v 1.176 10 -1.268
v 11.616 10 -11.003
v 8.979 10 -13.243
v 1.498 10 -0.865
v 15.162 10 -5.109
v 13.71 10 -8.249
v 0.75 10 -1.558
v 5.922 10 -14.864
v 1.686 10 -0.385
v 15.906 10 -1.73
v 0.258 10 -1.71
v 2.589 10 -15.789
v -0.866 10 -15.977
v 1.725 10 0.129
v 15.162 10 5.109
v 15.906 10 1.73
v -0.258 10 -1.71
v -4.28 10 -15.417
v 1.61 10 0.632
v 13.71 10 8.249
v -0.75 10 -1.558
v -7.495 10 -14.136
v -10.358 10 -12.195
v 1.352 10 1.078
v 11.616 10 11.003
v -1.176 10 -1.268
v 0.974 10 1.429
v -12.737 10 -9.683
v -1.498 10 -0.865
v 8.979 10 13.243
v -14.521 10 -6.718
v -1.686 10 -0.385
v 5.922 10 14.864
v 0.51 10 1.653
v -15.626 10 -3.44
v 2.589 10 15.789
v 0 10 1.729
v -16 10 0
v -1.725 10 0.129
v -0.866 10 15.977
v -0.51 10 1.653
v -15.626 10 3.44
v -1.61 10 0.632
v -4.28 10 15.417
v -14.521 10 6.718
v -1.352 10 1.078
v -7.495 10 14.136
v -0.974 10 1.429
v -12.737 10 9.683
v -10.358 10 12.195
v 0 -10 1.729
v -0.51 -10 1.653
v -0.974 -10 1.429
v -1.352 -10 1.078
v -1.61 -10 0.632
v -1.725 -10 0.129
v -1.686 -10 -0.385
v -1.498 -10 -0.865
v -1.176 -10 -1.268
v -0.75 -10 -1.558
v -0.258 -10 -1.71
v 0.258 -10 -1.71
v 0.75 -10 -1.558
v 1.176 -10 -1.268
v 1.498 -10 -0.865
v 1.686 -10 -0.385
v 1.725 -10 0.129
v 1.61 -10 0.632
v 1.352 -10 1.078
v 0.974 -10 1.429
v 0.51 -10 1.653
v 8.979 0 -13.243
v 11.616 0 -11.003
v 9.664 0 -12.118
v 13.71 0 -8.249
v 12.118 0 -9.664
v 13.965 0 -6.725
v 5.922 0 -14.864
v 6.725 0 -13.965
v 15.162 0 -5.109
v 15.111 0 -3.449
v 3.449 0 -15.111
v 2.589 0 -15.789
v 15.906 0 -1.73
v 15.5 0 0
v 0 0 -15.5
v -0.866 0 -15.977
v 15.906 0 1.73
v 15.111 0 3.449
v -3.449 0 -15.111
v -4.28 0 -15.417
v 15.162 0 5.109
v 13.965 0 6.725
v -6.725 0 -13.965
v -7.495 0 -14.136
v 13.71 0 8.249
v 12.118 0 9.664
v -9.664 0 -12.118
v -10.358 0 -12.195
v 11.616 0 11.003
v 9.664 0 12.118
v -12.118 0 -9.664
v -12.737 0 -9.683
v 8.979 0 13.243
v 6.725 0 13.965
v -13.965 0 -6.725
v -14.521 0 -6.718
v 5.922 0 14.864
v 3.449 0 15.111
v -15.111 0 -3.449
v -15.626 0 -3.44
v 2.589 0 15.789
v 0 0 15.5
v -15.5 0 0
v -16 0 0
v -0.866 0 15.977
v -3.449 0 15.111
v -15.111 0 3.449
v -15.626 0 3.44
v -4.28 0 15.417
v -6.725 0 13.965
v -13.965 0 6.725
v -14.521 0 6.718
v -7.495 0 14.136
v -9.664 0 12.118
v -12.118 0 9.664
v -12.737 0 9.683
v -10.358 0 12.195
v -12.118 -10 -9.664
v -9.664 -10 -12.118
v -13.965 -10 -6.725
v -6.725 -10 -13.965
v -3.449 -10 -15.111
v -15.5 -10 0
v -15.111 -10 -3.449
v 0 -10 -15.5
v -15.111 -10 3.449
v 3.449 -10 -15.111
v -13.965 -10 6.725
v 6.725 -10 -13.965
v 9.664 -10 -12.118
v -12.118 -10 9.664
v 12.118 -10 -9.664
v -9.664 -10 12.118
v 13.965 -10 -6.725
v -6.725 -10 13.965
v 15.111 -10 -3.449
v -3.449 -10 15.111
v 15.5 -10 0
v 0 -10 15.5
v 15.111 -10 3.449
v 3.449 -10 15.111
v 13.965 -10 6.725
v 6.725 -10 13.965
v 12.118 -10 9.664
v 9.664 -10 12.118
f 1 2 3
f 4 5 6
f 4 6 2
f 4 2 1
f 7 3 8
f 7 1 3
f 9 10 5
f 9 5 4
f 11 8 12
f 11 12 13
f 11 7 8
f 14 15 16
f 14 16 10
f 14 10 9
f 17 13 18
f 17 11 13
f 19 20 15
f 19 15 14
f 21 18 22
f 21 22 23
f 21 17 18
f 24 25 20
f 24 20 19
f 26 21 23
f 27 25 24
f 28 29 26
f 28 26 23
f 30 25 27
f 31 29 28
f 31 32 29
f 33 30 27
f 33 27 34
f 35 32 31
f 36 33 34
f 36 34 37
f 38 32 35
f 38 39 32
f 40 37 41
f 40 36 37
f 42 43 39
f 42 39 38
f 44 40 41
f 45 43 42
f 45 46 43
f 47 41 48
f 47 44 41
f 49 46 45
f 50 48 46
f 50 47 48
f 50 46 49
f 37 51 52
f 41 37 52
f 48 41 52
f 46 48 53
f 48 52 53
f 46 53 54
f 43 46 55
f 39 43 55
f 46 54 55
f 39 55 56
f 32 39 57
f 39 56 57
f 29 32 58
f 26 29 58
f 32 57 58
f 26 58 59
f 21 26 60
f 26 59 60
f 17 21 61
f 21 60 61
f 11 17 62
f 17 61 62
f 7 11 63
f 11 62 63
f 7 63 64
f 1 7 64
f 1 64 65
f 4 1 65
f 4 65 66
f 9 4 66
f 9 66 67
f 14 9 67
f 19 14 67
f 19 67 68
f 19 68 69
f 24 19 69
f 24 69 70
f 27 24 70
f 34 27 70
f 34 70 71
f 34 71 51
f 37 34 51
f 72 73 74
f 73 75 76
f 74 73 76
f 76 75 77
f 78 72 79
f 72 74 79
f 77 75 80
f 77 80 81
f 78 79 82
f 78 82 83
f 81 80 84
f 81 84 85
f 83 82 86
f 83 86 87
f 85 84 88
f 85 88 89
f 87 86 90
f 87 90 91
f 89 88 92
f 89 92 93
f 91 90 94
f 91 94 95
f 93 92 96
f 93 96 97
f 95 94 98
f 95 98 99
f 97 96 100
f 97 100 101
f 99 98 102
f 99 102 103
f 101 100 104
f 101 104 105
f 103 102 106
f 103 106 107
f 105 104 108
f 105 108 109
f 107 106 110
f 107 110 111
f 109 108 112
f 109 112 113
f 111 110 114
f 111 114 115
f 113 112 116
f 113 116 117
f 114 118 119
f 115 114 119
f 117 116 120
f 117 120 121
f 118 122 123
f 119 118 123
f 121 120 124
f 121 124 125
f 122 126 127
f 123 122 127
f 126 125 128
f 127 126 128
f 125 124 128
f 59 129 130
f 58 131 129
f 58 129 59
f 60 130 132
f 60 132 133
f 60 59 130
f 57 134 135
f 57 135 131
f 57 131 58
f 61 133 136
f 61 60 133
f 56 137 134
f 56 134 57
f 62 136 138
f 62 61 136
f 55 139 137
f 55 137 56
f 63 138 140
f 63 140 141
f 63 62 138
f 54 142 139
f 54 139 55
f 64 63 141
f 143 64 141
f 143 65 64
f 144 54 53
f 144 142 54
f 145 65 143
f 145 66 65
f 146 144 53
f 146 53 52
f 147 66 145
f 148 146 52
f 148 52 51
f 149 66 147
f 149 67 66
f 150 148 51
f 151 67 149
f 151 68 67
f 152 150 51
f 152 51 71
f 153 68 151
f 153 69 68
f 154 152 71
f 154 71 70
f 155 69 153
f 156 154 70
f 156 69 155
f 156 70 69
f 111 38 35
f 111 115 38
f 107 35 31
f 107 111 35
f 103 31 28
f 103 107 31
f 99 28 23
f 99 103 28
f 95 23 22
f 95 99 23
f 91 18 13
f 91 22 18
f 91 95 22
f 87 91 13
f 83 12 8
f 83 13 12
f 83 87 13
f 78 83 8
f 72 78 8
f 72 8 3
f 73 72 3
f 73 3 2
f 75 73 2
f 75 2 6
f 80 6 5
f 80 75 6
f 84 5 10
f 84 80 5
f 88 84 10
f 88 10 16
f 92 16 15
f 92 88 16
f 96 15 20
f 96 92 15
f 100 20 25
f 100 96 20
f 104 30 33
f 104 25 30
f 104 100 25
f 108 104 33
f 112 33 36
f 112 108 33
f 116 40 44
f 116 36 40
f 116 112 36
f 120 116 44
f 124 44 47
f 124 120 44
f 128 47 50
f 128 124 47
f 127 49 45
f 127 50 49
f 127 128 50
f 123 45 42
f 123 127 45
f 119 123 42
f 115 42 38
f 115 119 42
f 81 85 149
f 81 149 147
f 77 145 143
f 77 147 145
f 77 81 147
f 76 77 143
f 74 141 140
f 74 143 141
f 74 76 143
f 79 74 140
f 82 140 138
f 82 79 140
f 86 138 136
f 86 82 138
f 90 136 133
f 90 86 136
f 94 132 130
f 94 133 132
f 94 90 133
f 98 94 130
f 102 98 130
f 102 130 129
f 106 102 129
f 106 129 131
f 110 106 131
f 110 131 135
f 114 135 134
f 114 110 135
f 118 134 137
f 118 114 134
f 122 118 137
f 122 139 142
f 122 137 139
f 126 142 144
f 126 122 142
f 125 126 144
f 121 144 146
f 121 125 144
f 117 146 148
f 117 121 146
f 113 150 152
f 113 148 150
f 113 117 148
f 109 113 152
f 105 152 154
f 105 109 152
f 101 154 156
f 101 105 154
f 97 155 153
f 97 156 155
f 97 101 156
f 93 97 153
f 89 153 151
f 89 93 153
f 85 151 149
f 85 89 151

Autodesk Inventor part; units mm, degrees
ref_plane "YZ Plane" through (0, 0, 0) normal (1, 0, 0) x (0, 1, 0)
ref_plane "XZ Plane" through (0, 0, 0) normal (0, 1, 0) x (-1, 0, 0)
ref_plane "XY Plane" through (0, 0, 0) normal (0, 0, 1) x (1, 0, 0)
sketch "Sketch4" plane through (0, 0, 0) normal (0, 1, 0) x (-1, 0, 0)
  circle A0 centre (0, 0) radius 16
  dimension "d19" = 32
extrude "Extrusion2" add sketch "Sketch4" along normal blind 10
sketch "Sketch5" plane through (0, 0, 0) normal (0, -1, 0) x (1, 0, 0)
  circle A0 centre (0, 0) radius 15.5
  dimension "d22" = 31
extrude "Extrusion3" add sketch "Sketch5" along normal blind 10
sketch "Sketch6" plane through (0, 10, 0) normal (0, 1, 0) x (1, 0, 0)
  point P0 (0, 0)
  point P1 (0, 0)
hole "Hole2" at (0, 10, 0) direction (0, -1, 0) diameter 3.4587 end through all thread size "M4x0.5" class "6H" standard "ISO Metric profile"
equation "\"d30\" = Thickness"
equation "\"BendRadius\" = Thickness"
equation "\"BendReliefWidth\" = Thickness"
equation "\"BendReliefDepth\" = 0.5 * Thickness"
equation "\"CornerReliefSize\" = 4 * Thickness"
equation "\"MinimumRemnant\" = 2 * Thickness"
equation "\"TransitionRadius\" = BendRadius"
equation "\"JacobiRadiusSize\" = BendRadius"
equation "\"GapSize\" = Thickness"
equation "\"Thickness\" = 0.5"
properties part number "Output link probe hub_ final"
